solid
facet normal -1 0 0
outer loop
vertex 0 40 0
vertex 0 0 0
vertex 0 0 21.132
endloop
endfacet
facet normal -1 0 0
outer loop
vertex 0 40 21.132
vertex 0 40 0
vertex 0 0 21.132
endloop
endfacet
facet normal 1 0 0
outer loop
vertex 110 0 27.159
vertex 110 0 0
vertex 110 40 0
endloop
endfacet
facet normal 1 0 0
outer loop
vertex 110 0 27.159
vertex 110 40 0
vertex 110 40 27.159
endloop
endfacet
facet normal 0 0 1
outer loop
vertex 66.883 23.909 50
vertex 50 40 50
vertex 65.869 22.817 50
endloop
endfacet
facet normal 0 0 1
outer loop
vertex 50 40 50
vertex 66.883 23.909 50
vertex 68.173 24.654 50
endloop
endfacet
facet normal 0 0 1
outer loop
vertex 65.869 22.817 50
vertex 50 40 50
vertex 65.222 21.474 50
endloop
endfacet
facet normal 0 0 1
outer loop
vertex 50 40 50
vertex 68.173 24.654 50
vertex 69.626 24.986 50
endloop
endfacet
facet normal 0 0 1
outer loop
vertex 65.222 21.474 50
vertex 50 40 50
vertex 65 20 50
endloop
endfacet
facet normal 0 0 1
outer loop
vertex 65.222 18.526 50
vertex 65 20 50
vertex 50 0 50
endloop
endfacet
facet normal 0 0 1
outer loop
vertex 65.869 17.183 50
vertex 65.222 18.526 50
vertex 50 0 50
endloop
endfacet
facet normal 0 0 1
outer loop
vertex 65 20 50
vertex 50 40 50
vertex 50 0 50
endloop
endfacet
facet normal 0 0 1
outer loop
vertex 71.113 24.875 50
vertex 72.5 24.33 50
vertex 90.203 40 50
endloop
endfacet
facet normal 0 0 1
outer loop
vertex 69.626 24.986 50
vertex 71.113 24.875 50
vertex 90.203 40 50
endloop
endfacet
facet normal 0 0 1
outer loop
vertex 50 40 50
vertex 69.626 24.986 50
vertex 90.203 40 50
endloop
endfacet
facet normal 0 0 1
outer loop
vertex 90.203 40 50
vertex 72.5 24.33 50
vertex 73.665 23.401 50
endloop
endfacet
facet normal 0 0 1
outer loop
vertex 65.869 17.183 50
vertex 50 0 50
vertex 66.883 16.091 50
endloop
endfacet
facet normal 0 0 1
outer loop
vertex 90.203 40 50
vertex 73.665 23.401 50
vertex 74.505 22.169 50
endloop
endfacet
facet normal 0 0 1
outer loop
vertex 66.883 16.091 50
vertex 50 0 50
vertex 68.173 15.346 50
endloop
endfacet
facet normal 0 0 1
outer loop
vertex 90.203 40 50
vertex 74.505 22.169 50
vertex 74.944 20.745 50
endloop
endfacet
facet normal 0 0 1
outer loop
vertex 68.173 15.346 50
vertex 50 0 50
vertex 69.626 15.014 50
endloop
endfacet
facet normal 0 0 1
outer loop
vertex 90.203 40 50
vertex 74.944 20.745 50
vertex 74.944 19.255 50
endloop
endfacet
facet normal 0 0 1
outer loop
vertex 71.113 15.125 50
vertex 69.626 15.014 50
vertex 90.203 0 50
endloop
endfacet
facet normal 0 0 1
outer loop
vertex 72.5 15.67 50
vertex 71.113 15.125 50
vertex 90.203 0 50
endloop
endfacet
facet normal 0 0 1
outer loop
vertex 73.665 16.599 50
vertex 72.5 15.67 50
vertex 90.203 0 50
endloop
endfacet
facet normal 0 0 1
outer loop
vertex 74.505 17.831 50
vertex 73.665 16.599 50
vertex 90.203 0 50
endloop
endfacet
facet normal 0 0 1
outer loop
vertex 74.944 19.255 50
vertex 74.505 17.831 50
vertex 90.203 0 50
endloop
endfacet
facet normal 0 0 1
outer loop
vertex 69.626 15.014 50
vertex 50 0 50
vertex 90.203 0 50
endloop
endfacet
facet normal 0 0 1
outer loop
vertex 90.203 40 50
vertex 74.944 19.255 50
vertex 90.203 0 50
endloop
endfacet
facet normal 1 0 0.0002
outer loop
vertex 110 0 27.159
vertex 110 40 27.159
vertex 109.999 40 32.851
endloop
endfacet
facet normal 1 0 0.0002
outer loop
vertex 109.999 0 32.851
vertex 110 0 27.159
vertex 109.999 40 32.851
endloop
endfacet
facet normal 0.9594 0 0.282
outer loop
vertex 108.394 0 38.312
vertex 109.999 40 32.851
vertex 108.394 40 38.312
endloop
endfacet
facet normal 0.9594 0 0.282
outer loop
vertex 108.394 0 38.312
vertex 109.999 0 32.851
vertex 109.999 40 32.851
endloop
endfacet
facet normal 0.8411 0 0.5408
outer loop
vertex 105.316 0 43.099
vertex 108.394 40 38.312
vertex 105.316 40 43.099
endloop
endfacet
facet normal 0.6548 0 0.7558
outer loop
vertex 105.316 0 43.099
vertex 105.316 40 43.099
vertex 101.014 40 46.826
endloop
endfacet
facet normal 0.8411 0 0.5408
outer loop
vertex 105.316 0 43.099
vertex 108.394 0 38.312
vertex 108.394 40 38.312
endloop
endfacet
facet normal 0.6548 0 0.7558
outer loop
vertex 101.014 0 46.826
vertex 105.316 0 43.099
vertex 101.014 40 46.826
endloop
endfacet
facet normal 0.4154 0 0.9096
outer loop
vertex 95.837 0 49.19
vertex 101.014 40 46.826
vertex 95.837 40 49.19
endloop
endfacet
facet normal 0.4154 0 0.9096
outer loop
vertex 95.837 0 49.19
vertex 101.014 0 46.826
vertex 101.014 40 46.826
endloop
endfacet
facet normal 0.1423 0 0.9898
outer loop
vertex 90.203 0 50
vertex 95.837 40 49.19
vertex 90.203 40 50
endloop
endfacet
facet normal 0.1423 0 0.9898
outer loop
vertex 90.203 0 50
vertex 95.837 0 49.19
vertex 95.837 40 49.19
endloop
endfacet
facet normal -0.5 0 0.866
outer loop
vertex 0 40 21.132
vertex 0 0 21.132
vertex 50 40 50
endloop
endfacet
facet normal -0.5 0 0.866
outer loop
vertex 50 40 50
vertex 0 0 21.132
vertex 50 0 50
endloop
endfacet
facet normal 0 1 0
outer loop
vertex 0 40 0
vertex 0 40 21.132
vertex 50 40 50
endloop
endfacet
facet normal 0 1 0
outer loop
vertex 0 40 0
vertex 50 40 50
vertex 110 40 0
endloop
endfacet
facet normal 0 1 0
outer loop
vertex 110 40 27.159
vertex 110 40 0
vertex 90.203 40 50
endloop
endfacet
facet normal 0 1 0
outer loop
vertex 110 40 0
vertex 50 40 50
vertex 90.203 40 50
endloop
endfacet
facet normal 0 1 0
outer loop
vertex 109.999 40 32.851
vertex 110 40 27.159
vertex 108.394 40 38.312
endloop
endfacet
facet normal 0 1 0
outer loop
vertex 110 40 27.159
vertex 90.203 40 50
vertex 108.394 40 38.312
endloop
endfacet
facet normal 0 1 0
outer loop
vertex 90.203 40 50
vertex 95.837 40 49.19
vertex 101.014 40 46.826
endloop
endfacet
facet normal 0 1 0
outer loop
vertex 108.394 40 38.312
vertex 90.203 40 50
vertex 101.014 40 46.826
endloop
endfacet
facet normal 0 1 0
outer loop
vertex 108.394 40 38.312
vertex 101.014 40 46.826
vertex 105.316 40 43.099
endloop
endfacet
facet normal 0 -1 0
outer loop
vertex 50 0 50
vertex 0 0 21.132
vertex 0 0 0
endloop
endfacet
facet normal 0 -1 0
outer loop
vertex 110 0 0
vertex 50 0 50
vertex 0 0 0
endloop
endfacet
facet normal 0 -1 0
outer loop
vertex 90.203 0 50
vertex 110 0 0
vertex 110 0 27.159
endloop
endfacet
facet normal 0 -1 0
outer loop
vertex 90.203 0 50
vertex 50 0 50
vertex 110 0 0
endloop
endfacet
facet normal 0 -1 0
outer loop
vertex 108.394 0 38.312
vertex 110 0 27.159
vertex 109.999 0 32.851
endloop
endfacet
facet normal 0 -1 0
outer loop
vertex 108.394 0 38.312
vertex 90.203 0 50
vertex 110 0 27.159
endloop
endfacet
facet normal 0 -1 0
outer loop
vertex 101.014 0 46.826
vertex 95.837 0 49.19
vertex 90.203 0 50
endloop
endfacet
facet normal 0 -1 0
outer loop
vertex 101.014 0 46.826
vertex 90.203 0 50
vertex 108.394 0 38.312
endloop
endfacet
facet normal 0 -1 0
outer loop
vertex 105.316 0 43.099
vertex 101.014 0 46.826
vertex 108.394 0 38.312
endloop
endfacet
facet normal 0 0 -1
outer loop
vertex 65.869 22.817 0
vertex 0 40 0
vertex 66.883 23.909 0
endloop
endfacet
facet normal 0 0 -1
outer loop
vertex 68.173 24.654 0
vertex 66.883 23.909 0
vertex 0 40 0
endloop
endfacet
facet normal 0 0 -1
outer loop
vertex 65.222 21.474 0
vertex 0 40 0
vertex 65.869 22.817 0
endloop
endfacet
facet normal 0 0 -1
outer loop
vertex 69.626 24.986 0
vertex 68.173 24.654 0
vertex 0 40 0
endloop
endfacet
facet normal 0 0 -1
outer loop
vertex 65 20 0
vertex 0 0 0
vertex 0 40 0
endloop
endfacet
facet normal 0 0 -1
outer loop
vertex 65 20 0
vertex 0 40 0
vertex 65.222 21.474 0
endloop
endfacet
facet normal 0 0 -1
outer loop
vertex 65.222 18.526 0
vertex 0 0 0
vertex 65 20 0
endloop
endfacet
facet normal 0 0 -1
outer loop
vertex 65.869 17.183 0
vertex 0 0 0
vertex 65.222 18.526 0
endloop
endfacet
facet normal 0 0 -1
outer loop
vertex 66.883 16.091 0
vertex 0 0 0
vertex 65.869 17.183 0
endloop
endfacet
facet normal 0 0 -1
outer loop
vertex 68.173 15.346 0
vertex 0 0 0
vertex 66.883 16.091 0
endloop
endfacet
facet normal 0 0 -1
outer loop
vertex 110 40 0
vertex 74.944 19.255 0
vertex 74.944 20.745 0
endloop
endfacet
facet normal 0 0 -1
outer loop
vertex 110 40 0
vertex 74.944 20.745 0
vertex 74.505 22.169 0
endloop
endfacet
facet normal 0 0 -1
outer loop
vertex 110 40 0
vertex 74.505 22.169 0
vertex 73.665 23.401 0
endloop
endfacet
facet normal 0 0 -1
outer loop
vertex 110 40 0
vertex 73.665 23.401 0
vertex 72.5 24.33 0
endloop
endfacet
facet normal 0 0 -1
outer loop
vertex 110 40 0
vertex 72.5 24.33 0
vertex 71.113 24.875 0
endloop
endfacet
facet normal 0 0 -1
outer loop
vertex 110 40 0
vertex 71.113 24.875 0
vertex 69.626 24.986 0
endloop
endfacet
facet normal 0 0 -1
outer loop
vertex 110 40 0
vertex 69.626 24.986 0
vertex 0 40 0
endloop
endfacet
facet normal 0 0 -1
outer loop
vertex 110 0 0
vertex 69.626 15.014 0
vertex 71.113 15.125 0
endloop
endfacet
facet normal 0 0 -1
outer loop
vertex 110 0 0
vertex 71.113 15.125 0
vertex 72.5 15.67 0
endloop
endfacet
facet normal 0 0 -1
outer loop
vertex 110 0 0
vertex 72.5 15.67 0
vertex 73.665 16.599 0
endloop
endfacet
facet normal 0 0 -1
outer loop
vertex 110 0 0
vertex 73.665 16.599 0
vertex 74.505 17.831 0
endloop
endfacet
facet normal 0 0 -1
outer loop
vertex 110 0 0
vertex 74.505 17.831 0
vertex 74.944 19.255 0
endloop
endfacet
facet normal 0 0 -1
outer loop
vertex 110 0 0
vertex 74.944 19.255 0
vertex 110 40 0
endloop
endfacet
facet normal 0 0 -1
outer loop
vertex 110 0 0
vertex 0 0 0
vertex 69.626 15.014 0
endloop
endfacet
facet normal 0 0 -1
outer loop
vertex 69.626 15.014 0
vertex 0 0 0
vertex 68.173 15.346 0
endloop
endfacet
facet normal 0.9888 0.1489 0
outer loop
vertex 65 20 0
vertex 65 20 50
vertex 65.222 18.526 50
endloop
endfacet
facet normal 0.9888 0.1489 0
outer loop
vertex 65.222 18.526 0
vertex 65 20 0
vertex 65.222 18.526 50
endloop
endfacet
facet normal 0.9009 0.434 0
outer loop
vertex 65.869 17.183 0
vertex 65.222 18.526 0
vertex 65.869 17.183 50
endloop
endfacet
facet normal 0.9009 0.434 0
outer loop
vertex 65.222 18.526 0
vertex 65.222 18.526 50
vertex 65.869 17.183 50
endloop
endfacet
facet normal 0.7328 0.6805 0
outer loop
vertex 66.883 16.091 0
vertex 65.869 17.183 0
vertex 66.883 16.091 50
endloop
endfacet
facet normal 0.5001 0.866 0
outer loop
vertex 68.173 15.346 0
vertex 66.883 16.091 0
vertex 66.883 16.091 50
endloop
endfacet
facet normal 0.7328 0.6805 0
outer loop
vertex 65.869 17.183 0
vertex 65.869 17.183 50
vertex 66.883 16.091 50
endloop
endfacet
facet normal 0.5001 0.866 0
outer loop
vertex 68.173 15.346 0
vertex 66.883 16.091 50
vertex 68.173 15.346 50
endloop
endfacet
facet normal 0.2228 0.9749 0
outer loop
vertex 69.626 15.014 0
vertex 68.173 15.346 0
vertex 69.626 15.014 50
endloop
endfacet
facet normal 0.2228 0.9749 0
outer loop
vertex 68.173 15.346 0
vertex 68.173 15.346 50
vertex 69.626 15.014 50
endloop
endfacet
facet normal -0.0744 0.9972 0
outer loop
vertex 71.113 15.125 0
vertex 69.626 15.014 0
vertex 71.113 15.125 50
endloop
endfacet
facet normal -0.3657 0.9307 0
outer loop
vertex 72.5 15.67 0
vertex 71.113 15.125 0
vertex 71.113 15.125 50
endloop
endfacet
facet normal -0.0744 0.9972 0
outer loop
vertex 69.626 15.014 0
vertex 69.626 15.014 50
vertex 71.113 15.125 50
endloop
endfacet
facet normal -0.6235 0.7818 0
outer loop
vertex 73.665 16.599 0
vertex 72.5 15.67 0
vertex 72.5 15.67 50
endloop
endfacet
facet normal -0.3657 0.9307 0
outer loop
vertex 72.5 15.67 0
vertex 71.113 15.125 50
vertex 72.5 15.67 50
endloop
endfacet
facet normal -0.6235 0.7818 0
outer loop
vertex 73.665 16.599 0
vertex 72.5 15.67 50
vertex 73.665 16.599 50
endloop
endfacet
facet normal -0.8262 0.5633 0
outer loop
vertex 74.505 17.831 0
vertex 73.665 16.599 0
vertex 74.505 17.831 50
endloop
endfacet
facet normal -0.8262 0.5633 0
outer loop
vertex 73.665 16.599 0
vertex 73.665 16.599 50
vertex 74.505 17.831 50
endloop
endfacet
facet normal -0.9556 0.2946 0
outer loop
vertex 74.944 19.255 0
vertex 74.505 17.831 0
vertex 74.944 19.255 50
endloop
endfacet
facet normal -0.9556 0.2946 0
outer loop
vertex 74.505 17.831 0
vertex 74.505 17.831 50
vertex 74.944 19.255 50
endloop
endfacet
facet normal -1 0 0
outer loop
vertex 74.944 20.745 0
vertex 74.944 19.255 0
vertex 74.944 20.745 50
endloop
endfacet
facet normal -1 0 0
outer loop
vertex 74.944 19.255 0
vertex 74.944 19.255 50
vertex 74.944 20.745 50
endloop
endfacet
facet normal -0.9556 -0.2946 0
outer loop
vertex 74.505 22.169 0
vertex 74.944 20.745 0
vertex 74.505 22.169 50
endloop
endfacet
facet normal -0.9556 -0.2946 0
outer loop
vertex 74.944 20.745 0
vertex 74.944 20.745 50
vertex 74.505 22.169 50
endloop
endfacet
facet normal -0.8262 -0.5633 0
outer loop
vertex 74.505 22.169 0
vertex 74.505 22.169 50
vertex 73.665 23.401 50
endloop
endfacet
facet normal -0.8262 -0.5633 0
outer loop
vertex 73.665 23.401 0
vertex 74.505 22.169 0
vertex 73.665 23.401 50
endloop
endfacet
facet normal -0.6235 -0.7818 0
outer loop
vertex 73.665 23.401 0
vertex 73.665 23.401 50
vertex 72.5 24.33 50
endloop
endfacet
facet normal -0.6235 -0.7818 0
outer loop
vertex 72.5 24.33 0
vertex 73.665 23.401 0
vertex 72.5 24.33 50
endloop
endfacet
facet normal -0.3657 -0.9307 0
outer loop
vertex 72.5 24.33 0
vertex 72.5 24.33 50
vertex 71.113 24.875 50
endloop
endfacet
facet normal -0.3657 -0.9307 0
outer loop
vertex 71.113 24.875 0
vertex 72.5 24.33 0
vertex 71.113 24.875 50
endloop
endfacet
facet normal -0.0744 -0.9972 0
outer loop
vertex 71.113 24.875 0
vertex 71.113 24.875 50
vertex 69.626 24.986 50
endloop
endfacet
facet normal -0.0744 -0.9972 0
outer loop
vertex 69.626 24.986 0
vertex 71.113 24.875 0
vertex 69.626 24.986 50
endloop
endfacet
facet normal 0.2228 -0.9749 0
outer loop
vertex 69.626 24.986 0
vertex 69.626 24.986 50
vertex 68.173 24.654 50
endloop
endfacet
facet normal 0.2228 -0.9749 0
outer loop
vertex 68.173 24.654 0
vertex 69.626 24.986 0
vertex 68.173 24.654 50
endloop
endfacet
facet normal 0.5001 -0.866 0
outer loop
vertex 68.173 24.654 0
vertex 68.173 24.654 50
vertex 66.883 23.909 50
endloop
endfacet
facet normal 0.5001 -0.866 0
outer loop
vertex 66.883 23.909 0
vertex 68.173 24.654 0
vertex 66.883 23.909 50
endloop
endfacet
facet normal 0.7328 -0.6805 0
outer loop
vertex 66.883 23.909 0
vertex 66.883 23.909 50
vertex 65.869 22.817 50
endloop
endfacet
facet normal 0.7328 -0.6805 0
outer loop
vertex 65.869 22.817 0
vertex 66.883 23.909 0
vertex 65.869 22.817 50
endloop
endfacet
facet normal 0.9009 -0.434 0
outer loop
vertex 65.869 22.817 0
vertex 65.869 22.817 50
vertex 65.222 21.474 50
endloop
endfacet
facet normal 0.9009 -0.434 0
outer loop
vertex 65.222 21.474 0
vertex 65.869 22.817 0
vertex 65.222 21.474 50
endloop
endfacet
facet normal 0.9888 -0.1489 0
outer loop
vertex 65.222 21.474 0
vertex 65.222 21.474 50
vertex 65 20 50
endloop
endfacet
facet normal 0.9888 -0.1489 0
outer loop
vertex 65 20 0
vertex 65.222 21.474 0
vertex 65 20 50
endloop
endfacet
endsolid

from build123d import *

# Parameters (mm, degrees)
PAD_DEPTH    = 40
SKETCH_R     = 5
POCKET_DEPTH = 50.001


with BuildPart() as part:
    # Sketch001 → Pad (new body)
    with BuildSketch(Plane.XZ):
        with BuildLine():
            Line((0, 0), (110, 0))
            Line((110, 0), (110, 27.159005))
            ThreePointArc((110, 27.159005), (105.316047, 43.099238), (90.20281, 50))
            Line((50, 50), (90.20281, 50))
            Line((0, 21.132487), (50, 50))
            Line((0, 0), (0, 21.132487))
        make_face()
    extrude(amount=-PAD_DEPTH)

    # Sketch (on Face4 of Pad) → Pocket (cut, through all)
    with BuildSketch(Plane(origin=(0, 0, 50), x_dir=(-1, 0, 0), z_dir=(0, 0, 1))):
        with Locations((-69.999992, -20.000006)):
            Circle(SKETCH_R)
    extrude(amount=-POCKET_DEPTH, mode=Mode.SUBTRACT)


solid = part.part
